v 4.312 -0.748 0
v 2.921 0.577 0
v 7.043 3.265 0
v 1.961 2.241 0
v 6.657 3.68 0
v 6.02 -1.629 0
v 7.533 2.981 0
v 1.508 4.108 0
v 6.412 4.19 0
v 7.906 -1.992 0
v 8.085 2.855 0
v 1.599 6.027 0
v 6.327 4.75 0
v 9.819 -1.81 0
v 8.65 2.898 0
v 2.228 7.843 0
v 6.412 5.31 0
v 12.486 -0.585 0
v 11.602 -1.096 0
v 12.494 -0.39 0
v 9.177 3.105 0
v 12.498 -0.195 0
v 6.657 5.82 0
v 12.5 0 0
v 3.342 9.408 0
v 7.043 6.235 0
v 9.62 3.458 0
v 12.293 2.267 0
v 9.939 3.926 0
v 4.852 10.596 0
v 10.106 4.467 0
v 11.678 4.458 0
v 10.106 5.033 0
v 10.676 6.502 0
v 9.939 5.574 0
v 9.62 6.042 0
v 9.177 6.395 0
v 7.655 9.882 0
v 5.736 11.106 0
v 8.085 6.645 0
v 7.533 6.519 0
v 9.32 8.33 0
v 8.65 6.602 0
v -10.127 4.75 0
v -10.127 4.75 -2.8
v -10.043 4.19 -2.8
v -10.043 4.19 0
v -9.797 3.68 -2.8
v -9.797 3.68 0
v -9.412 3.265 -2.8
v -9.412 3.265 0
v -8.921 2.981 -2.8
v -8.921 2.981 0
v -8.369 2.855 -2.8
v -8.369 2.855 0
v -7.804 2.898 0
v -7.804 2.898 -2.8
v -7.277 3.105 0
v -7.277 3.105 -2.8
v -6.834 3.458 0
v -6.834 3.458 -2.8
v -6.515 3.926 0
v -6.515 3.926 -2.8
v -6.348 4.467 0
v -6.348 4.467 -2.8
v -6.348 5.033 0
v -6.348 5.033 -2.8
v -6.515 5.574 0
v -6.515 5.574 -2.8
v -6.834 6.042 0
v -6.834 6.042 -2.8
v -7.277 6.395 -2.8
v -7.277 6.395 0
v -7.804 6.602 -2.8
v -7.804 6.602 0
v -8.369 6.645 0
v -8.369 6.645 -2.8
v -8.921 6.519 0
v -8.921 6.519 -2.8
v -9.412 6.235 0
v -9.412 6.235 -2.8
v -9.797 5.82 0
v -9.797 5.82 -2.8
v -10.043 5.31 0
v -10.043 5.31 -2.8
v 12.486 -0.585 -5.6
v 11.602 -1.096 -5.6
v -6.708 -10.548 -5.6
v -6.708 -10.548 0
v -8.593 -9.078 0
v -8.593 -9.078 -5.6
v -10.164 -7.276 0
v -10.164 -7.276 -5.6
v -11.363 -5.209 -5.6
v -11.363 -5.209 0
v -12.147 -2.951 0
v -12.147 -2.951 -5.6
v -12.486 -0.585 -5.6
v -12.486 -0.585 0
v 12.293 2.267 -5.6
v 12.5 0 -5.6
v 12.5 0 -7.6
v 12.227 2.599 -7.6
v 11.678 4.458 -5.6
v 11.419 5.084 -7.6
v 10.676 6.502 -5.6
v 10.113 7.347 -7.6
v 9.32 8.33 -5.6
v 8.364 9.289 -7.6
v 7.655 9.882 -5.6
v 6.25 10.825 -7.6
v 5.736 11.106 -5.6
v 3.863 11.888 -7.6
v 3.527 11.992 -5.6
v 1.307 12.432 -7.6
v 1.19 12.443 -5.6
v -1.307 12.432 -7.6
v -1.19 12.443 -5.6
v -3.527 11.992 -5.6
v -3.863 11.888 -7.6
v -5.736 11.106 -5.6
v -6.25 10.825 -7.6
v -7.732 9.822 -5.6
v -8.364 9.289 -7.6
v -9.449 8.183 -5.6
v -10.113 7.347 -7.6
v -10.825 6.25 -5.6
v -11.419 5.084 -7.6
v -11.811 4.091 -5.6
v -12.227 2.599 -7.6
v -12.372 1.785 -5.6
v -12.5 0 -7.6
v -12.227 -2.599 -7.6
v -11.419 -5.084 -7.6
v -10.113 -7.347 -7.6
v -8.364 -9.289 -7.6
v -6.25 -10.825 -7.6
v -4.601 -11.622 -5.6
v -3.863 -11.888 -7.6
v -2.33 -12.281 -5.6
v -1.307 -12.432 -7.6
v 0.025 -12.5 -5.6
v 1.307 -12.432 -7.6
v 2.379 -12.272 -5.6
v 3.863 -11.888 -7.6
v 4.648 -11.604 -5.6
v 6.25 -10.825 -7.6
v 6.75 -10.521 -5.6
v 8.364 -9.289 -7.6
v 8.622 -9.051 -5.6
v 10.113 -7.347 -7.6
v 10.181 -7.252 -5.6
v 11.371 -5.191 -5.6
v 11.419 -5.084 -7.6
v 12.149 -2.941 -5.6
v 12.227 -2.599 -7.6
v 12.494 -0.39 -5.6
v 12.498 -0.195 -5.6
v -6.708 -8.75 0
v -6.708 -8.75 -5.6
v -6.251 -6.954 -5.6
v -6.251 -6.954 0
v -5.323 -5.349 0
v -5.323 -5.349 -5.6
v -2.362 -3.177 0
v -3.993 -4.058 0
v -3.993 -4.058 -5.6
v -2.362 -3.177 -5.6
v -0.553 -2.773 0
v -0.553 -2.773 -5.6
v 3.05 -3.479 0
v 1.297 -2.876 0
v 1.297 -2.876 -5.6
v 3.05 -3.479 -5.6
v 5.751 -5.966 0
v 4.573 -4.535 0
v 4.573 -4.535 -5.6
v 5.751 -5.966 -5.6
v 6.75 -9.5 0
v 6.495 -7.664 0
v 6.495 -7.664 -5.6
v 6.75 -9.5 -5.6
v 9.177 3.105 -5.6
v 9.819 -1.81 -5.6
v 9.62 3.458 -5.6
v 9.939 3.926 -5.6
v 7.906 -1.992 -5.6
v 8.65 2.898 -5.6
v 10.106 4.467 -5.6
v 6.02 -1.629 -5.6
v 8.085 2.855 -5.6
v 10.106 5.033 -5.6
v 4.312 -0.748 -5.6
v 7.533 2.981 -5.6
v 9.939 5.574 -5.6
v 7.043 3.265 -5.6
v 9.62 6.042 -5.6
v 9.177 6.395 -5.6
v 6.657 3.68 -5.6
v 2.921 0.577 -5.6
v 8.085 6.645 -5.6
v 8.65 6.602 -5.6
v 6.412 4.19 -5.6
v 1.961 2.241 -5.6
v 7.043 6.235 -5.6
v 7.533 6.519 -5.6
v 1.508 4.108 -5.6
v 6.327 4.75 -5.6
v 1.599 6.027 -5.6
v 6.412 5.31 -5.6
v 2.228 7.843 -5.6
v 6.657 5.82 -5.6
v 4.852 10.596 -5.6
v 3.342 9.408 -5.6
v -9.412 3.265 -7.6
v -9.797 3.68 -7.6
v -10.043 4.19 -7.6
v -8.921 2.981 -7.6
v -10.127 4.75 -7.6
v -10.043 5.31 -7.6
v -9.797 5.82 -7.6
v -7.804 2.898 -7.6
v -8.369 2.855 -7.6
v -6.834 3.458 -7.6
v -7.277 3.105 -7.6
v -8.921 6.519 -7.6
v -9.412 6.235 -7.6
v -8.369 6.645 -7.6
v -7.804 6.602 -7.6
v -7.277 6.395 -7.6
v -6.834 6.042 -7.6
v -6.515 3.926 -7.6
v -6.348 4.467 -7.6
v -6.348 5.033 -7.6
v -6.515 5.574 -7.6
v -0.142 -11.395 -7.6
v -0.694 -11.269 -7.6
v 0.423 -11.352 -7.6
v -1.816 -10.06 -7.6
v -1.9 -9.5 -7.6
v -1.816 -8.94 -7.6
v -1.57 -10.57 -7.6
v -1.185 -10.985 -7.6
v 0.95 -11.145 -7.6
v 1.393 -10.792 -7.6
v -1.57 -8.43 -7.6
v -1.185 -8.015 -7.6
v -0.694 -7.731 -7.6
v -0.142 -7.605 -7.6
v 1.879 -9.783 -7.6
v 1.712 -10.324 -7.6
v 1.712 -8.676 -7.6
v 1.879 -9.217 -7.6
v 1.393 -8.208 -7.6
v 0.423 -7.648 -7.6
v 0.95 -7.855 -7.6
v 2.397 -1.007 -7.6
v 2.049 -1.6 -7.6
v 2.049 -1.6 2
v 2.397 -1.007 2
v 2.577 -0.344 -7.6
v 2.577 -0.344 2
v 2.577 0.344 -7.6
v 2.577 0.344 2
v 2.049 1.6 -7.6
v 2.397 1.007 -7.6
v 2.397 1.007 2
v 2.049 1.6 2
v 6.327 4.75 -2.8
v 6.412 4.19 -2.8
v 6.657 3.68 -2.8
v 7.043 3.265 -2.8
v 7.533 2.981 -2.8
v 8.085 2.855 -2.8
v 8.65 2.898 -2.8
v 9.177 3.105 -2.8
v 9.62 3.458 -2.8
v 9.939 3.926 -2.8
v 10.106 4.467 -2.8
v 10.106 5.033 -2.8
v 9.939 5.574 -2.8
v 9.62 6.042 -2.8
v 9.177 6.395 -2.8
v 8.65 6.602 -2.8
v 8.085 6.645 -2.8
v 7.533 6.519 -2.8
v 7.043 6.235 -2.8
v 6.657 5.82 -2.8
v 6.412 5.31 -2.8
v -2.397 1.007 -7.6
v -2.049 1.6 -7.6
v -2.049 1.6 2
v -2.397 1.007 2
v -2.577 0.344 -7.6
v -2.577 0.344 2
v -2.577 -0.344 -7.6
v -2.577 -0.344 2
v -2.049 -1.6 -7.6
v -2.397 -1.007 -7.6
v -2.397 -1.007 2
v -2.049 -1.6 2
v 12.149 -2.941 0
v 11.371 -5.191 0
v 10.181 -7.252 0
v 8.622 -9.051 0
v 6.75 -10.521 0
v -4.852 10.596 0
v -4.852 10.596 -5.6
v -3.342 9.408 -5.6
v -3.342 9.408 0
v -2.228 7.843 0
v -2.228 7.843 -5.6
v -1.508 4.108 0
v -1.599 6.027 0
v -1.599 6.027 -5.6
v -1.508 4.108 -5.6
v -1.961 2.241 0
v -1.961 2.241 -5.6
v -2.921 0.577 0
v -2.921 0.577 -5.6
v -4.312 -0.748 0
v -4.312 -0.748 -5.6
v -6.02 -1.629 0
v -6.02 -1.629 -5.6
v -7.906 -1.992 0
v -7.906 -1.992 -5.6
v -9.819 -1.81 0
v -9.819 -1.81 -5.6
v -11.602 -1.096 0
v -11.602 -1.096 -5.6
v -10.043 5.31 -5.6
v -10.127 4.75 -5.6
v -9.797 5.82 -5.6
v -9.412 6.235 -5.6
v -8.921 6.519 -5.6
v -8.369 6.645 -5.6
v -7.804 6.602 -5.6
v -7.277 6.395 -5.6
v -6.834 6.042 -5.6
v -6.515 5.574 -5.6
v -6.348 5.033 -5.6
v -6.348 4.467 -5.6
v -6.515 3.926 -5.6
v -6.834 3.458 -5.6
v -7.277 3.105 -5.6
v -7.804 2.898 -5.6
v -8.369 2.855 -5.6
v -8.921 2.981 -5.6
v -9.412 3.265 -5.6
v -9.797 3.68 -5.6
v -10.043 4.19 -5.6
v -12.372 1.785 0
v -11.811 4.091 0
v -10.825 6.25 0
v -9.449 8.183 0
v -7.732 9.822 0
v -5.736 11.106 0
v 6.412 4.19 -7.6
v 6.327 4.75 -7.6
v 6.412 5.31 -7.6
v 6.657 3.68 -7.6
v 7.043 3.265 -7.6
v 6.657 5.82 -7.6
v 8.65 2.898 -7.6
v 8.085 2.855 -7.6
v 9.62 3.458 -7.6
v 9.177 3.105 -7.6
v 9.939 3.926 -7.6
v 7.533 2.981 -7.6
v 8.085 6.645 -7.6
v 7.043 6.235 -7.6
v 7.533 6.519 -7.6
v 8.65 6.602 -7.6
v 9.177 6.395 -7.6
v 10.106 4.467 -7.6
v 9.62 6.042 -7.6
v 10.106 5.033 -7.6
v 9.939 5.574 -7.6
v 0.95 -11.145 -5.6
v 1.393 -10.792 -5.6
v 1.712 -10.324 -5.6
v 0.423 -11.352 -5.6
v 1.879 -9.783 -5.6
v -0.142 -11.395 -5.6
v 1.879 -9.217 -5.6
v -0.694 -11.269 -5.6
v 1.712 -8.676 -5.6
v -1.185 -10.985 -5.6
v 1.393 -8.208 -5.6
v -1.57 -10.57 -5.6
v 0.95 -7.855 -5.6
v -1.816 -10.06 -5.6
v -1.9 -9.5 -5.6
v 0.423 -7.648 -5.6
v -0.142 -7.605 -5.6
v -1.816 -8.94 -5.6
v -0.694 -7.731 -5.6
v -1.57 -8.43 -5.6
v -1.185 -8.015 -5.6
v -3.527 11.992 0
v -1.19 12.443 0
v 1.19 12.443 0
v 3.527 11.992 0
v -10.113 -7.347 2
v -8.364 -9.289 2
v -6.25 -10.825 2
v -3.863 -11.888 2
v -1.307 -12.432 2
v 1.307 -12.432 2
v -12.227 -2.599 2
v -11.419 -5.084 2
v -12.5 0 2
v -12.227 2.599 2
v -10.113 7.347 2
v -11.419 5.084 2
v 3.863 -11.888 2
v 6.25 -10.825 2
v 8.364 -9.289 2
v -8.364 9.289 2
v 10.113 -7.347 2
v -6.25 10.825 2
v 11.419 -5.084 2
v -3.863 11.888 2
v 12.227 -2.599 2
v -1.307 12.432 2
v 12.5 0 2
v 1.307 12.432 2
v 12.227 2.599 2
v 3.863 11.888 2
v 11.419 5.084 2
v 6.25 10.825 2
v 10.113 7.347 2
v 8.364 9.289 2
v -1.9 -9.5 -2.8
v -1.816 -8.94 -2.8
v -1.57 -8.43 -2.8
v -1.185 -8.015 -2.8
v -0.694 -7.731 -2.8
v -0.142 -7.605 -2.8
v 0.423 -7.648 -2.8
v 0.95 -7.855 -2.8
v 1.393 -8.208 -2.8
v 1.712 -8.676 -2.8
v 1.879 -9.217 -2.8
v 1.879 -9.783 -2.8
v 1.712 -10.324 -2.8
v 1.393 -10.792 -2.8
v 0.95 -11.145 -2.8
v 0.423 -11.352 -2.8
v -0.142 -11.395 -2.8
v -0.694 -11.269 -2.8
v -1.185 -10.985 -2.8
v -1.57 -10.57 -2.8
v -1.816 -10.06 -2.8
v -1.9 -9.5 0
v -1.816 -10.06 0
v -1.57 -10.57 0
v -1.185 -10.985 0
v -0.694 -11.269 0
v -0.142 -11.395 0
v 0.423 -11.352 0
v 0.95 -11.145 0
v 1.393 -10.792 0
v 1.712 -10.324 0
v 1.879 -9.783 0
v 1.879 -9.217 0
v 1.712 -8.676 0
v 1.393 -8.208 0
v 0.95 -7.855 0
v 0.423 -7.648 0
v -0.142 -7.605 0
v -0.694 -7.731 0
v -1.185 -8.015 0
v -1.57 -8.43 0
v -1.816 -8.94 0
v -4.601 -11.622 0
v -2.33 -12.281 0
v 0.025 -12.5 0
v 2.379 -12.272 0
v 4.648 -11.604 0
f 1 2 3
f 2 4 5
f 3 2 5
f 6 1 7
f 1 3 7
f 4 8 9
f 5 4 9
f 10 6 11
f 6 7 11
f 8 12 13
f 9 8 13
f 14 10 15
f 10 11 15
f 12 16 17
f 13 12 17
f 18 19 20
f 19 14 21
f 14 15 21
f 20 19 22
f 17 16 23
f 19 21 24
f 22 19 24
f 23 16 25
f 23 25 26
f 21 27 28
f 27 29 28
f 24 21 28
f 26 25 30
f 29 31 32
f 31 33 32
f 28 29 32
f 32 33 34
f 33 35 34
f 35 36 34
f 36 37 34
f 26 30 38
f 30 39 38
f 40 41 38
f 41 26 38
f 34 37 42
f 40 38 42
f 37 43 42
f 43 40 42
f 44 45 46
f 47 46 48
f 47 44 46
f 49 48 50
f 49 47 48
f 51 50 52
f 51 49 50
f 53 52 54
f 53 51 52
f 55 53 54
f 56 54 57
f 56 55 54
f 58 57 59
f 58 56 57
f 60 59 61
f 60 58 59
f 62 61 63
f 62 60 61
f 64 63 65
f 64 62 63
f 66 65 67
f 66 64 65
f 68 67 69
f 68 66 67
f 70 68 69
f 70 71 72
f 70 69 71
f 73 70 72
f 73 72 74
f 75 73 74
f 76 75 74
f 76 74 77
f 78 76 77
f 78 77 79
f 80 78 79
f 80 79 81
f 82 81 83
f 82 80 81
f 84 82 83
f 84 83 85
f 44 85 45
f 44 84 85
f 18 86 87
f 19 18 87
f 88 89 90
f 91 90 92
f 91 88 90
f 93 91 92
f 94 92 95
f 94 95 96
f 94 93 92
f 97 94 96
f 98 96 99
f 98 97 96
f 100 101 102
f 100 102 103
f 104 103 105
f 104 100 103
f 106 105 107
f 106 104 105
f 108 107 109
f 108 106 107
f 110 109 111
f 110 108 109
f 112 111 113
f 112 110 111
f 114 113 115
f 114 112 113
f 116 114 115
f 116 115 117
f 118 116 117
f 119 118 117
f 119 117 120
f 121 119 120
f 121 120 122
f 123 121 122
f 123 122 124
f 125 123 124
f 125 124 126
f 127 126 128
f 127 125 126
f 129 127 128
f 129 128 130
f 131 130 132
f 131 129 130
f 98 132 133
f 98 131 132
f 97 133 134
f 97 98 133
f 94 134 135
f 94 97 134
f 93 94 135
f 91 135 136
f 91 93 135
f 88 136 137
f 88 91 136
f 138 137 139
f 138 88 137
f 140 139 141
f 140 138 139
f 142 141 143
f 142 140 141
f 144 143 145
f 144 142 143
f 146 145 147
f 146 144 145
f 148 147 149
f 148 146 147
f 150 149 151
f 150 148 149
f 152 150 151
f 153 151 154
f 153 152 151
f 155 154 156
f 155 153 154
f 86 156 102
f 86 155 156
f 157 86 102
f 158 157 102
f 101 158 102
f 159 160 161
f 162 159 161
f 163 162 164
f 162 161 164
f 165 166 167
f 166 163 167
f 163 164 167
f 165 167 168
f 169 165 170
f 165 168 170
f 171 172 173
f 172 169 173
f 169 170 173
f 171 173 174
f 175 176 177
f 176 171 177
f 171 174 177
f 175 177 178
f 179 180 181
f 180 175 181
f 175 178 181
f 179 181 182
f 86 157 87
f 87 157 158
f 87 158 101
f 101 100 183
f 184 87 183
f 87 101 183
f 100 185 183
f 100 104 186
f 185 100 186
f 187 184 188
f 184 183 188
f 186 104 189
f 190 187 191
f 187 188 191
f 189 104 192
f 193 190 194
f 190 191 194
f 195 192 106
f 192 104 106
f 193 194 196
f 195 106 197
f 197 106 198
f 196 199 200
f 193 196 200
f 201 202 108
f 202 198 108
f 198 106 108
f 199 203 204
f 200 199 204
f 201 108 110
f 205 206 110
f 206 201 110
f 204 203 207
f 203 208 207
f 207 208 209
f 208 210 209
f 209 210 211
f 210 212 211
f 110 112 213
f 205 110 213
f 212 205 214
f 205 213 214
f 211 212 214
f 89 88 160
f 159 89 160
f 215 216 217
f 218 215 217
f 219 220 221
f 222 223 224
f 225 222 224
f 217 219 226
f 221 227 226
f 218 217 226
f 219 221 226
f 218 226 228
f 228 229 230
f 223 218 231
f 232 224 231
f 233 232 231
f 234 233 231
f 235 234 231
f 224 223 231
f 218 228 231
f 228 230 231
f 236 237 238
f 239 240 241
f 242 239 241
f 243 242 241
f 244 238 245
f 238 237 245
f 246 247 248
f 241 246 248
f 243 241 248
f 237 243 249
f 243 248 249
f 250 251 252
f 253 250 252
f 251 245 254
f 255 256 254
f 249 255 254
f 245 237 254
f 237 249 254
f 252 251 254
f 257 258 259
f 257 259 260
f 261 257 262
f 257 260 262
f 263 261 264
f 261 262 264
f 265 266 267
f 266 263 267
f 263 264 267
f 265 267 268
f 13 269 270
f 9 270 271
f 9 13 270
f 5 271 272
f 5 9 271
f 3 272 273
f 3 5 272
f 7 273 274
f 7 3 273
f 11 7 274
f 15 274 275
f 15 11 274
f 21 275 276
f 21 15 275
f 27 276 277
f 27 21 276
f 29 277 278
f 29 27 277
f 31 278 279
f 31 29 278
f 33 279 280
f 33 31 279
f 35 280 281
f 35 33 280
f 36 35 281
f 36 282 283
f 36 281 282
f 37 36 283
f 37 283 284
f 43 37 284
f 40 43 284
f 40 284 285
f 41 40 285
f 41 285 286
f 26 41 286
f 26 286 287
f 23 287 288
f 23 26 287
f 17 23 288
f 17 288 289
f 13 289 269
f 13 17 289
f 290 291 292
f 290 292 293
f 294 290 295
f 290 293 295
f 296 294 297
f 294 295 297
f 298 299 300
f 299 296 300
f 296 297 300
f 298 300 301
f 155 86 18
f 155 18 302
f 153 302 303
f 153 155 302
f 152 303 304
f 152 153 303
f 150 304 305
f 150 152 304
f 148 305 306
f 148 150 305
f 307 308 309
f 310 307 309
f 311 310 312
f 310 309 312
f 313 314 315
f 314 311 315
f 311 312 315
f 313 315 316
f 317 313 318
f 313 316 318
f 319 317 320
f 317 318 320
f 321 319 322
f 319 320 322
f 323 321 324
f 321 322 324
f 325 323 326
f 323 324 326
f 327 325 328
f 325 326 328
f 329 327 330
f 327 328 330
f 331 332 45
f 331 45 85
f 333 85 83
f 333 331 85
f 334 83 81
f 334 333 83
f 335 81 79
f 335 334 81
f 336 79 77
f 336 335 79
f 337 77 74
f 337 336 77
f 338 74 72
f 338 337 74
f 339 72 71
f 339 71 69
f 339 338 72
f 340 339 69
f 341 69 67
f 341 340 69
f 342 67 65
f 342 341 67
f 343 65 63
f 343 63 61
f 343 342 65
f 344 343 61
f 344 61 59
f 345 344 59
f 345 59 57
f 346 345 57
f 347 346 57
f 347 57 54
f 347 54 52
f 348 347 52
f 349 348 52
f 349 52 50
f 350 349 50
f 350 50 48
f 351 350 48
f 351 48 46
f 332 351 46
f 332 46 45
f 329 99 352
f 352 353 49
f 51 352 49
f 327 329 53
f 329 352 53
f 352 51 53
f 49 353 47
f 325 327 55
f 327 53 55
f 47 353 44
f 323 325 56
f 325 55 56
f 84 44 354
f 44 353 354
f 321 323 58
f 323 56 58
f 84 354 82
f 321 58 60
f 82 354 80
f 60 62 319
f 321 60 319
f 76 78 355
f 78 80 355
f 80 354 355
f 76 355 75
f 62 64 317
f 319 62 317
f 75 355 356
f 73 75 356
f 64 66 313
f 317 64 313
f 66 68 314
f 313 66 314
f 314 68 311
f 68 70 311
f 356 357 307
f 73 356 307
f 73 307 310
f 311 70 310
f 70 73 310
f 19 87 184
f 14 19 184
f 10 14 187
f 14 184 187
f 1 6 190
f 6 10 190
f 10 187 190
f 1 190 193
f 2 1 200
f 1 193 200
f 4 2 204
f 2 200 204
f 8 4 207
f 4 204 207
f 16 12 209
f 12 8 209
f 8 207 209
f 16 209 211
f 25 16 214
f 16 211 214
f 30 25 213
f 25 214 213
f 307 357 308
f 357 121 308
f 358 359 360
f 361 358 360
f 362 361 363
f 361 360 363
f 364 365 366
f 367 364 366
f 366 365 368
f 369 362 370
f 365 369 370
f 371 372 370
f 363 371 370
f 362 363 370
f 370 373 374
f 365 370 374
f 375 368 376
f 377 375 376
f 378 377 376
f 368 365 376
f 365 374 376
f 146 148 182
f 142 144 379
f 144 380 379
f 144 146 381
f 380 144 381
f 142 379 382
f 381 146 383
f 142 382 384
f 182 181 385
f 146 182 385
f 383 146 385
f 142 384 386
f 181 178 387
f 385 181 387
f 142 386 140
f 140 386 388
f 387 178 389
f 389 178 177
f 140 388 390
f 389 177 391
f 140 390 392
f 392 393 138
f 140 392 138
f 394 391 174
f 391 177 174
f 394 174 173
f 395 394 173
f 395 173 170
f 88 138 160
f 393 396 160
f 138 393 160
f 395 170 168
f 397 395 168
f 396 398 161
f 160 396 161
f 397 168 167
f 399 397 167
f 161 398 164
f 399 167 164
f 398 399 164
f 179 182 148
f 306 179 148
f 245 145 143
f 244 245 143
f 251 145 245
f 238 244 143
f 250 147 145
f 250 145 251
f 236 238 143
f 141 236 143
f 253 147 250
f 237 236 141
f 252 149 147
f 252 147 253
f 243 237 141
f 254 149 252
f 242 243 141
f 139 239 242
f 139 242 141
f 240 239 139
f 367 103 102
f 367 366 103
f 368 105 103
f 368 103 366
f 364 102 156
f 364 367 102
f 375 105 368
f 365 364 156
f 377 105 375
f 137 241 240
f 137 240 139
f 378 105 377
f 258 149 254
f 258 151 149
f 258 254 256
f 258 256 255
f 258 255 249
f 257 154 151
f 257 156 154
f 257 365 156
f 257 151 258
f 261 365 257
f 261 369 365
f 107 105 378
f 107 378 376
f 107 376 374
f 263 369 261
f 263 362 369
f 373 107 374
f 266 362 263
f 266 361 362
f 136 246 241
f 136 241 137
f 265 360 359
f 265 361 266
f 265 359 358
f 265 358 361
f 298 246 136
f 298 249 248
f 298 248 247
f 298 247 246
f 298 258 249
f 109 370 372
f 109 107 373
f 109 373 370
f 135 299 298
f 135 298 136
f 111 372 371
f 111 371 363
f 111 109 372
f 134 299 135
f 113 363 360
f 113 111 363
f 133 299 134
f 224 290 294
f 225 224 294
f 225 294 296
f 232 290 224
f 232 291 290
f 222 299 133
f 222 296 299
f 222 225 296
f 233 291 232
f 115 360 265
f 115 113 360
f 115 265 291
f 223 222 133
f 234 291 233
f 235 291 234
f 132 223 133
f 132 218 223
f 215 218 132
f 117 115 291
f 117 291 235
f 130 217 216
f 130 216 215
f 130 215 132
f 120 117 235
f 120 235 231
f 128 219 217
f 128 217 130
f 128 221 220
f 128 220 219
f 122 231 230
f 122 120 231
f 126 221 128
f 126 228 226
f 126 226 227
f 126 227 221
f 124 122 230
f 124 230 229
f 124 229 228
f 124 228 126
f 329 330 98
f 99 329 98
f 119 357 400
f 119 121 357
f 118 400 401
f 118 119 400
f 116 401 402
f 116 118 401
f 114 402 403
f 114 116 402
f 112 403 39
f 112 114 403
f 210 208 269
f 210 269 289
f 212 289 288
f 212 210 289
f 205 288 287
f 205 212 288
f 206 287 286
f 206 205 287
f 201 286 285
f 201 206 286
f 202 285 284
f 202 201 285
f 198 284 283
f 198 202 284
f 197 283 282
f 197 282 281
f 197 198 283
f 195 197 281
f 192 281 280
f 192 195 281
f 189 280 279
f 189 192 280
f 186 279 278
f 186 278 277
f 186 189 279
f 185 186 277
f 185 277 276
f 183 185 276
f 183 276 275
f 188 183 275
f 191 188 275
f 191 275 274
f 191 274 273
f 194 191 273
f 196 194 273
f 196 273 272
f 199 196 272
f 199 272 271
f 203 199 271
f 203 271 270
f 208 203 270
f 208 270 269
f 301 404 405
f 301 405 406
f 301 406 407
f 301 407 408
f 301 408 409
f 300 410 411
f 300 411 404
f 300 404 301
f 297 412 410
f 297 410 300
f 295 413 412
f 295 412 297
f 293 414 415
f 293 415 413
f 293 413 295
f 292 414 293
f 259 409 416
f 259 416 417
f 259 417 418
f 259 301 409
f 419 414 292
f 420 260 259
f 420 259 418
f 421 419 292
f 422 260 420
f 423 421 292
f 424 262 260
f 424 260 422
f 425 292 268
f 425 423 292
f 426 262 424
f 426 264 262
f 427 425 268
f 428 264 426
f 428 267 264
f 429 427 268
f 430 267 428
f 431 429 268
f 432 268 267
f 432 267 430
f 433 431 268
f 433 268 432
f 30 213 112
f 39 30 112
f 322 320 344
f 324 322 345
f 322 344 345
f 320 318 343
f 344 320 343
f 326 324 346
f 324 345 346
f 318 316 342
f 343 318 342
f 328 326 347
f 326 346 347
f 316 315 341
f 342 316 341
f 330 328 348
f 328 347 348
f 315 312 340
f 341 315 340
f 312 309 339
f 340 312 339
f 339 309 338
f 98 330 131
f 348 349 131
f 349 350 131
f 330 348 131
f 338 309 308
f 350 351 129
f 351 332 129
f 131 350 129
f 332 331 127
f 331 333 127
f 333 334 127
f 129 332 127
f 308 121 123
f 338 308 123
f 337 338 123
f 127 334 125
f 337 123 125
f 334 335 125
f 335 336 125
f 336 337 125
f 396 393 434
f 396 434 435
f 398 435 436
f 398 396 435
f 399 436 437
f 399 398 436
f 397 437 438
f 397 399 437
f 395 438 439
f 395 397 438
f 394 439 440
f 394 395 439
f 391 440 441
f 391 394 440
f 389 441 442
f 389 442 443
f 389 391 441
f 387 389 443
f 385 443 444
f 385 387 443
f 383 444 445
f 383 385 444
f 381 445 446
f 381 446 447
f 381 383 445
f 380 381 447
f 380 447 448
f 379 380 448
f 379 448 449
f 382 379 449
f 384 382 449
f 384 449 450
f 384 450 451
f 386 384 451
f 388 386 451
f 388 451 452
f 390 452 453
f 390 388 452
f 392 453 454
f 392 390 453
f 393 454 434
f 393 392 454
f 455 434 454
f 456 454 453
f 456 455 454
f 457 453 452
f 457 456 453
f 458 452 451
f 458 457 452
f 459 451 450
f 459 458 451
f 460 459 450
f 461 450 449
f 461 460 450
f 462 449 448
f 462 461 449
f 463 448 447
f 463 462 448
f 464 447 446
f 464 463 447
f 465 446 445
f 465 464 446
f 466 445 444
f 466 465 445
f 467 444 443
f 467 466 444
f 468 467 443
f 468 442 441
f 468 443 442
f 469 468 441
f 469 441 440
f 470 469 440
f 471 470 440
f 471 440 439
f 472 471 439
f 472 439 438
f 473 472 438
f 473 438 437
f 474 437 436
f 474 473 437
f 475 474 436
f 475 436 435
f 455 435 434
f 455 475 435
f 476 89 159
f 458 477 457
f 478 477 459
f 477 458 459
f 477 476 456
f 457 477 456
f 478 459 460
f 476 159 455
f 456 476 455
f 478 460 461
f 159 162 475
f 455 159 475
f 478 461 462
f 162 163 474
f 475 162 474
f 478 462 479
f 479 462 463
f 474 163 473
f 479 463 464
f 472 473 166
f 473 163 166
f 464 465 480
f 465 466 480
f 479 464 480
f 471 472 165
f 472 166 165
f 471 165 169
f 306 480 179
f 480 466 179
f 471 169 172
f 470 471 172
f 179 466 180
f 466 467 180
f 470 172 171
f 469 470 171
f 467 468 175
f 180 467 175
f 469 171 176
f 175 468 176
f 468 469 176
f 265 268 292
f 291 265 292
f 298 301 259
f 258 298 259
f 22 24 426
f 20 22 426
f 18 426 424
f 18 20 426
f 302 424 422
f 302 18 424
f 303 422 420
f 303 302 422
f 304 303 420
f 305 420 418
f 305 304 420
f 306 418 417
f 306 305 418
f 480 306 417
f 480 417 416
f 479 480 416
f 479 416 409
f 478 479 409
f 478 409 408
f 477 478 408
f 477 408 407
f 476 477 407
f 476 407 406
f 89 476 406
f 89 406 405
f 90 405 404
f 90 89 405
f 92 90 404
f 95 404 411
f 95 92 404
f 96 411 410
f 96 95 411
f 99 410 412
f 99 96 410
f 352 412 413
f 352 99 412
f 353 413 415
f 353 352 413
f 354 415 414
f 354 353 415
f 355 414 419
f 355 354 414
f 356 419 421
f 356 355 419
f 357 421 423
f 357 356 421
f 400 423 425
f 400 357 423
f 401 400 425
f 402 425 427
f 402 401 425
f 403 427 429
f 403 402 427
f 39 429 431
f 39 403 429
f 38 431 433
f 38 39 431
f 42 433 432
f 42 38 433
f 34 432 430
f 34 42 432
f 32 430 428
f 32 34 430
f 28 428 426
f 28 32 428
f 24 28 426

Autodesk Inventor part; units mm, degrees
ref_plane "YZ Plane" through (0, 0, 0) normal (1, 0, 0) x (0, 1, 0)
ref_plane "XZ Plane" through (0, 0, 0) normal (0, 1, 0) x (-1, 0, 0)
ref_plane "XY Plane" through (0, 0, 0) normal (0, 0, 1) x (1, 0, 0)
sketch "Skizze3" plane through (0, 0, 0) normal (0, 0, 1) x (1, 0, 0)
  circle A0 centre (82.735856, -97.364718) radius 1.5
  circle A1 centre (87.344144, -89.642424) radius 2.777622
  circle A2 centre (0, 0) radius 12.5
  line L0 (0, -9.5) -> (-8.227241, 4.75)
  line L1 (-8.227241, 4.75) -> (8.227241, 4.75)
  line L2 (8.227241, 4.75) -> (0, -9.5)
  circle A3 centre (0, -9.5) radius 1.9
  circle A4 centre (8.227241, 4.75) radius 1.9
  circle A5 centre (-8.227241, 4.75) radius 1.9
  circle A6 centre (0, 0) radius 2.6
  line L3 (-2.04939, -1.6) -> (2.04939, -1.6)
  line L4 (-2.04939, 1.6) -> (2.04939, 1.6)
  circle A7 centre (8.227241, 4.75) radius 2 construction
  dimension "d10" = 25
  dimension "d11" = 9.5
  dimension "d12" = 3.8
  dimension "d13" = 3.8
  dimension "d14" = 3.8
  dimension "d15" = 5.2
  dimension "d16" = 1.6
  dimension "d17" = 1.6
sketch "Skizze3 outline for Extrusion3" plane through (0, 0, 0) normal (0, 0, 1) x (1, 0, 0)
  circle A0 centre (0, 0) radius 12.5
  circle A1 centre (0, -9.5) radius 1.9
  arc A2 (2.04939, 1.6) -> (2.04939, -1.6) centre (0, 0) cw
  line L0 (-2.04939, 1.6) -> (2.04939, 1.6)
  arc A3 (-2.04939, -1.6) -> (-2.04939, 1.6) centre (0, 0) cw
  line L1 (2.04939, -1.6) -> (-2.04939, -1.6)
  circle A4 centre (-8.227241, 4.75) radius 1.9
  circle A5 centre (8.227241, 4.75) radius 1.9
extrude "Extrusion3" add sketch "Skizze3 outline for Extrusion3" along normal blind 2
sketch "Skizze4" plane through (0, 0, 0) normal (0, 0, -1) x (-1, 0, 0)
  circle A0 centre (0, 0) radius 12.5
  circle A1 centre (8.227241, 4.75) radius 1.9
  circle A2 centre (0, -9.5) radius 1.9
  arc A3 (-2.04939, 1.6) -> (-2.04939, -1.6) centre (0, 0) ccw
  line L0 (2.04939, 1.6) -> (-2.04939, 1.6)
  arc A4 (2.04939, -1.6) -> (2.04939, 1.6) centre (0, 0) ccw
  line L1 (-2.04939, -1.6) -> (2.04939, -1.6)
  circle A5 centre (-8.227241, 4.75) radius 1.9
  circle A6 centre (0, -9.5) radius 6.75
  circle A7 centre (-8.227241, 4.75) radius 6.75
  circle A8 centre (8.227241, 4.75) radius 6.75
  line L2 (-6.75, -16.25) -> (6.7082, -16.25)
  line L3 (6.7082, -16.25) -> (6.7082, -8.749965)
  line L4 (6.7082, -8.749965) -> (-6.75, -8.749965)
  line L5 (-6.75, -8.749965) -> (-6.75, -16.25)
  line L6 (-6.75, -16.25) -> (6.7082, -8.749965) construction
  line L7 (6.7082, -16.25) -> (-6.75, -8.749965) construction
  line L8 (5.75657, -4.470671) -> (17.447913, 2.279329)
  line L9 (17.447913, 2.279329) -> (10.697913, 13.970671)
  line L10 (10.697913, 13.970671) -> (-0.99343, 7.220671)
  line L11 (-0.99343, 7.220671) -> (5.75657, -4.470671)
  line L12 (5.75657, -4.470671) -> (10.697913, 13.970671) construction
  line L13 (17.447913, 2.279329) -> (-0.99343, 7.220671) construction
  line L14 (0, 0) -> (8.227241, 4.75)
  line L15 (8.227241, 4.75) -> (0, 0)
  line L16 (0, 0) -> (-8.263885, 4.771156)
  line L17 (-5.75657, -4.470671) -> (0.99343, 7.220671)
  line L18 (0.99343, 7.220671) -> (-10.7712, 14.012984)
  line L19 (-10.7712, 14.012984) -> (-17.5212, 2.321641)
  line L20 (-17.5212, 2.321641) -> (-5.75657, -4.470671)
  line L21 (-5.75657, -4.470671) -> (-10.7712, 14.012984) construction
  line L22 (0.99343, 7.220671) -> (-17.5212, 2.321641) construction
  point P0 (5.826917, 11.058799)
  point P1 (12.490659, -0.483141)
  point P2 (-5.826917, 11.058799)
  point P3 (-12.490659, -0.483141)
  point P4 (-6.663742, -10.575658)
  point P5 (6.663742, -10.575658)
  point P6 (-0.0209, -12.499983)
  point P7 (-11.602241, -1.095671)
  point P8 (-12.486291, -0.585265)
  point P9 (-6.75, -10.520813)
  point P10 (-6.75, -9.5)
  point P11 (6.7082, -10.547514)
  point P12 (12.486291, -0.585265)
  point P13 (11.602241, -1.095671)
  point P14 (4.852241, 10.595671)
  point P15 (5.736291, 11.106078)
  point P16 (-5.736291, 11.106078)
  point P17 (-4.852241, 10.595671)
  dimension "d20" = 13.5
  dimension "d21" = 13.5
  dimension "d22" = 13.5
sketch "Skizze4 outline for Extrusion4" plane through (0, 0, 0) normal (0, 0, -1) x (-1, 0, 0)
  line L0 (-11.602241, -1.095671) -> (-12.486291, -0.585265)
  arc A0 (-4.852241, 10.595671) -> (-11.602241, -1.095671) centre (-8.227241, 4.75) cw
  arc A1 (-12.486291, -0.585265) -> (-6.75, -10.520813) centre (0, 0) ccw
  line L1 (-5.736291, 11.106078) -> (-4.852241, 10.595671)
  line L2 (-6.75, -10.520813) -> (-6.75, -9.5)
  arc A2 (5.736291, 11.106078) -> (-5.736291, 11.106078) centre (0, 0) ccw
  arc A3 (-6.75, -9.5) -> (6.7082, -8.749965) centre (0, -9.5) cw
  line L3 (4.852241, 10.595671) -> (5.736291, 11.106078)
  line L4 (6.7082, -8.749965) -> (6.7082, -10.547514)
  arc A4 (11.602241, -1.095671) -> (4.852241, 10.595671) centre (8.227241, 4.75) cw
  arc A5 (6.7082, -10.547514) -> (12.486291, -0.585265) centre (0, 0) ccw
  line L5 (12.486291, -0.585265) -> (11.602241, -1.095671)
  arc A6 (-2.04939, -1.6) -> (-2.04939, 1.6) centre (0, 0) cw
  line L6 (2.04939, -1.6) -> (-2.04939, -1.6)
  arc A7 (2.04939, 1.6) -> (2.04939, -1.6) centre (0, 0) cw
  line L7 (-2.04939, 1.6) -> (2.04939, 1.6)
extrude "Extrusion4" add sketch "Skizze4 outline for Extrusion4" along normal blind 2.8
sketch "Skizze9" plane through (0, 0, 0) normal (0, 0, -1) x (-1, 0, 0)
  circle A0 centre (-8.227241, 4.75) radius 1.9
  circle A1 centre (8.227241, 4.75) radius 1.9
  circle A2 centre (0, -9.5) radius 1.9
  point P0 (0, 0)
sketch "Skizze9 outline for Extrusion7" plane through (0, 0, 0) normal (0, 0, -1) x (-1, 0, 0)
  circle A0 centre (0, -9.5) radius 1.9
  circle A1 centre (8.227241, 4.75) radius 1.9
  circle A2 centre (-8.227241, 4.75) radius 1.9
extrude "Extrusion7" add sketch "Skizze9 outline for Extrusion7" along normal blind 2.8 and the other way blind 2
mirror "Spiegeln1" about plane through (0, 0.976243, -2.8) normal (0, 0, -1) of "Extrusion3", "Extrusion4", "Extrusion7"
equation "\"d12\" = d13"
equation "\"d14\" = d13"
equation "\"d17\" = d16"
equation "\"d20\" = d21"
equation "\"d22\" = d21"
properties part number "Pump_Rotatio_new."
